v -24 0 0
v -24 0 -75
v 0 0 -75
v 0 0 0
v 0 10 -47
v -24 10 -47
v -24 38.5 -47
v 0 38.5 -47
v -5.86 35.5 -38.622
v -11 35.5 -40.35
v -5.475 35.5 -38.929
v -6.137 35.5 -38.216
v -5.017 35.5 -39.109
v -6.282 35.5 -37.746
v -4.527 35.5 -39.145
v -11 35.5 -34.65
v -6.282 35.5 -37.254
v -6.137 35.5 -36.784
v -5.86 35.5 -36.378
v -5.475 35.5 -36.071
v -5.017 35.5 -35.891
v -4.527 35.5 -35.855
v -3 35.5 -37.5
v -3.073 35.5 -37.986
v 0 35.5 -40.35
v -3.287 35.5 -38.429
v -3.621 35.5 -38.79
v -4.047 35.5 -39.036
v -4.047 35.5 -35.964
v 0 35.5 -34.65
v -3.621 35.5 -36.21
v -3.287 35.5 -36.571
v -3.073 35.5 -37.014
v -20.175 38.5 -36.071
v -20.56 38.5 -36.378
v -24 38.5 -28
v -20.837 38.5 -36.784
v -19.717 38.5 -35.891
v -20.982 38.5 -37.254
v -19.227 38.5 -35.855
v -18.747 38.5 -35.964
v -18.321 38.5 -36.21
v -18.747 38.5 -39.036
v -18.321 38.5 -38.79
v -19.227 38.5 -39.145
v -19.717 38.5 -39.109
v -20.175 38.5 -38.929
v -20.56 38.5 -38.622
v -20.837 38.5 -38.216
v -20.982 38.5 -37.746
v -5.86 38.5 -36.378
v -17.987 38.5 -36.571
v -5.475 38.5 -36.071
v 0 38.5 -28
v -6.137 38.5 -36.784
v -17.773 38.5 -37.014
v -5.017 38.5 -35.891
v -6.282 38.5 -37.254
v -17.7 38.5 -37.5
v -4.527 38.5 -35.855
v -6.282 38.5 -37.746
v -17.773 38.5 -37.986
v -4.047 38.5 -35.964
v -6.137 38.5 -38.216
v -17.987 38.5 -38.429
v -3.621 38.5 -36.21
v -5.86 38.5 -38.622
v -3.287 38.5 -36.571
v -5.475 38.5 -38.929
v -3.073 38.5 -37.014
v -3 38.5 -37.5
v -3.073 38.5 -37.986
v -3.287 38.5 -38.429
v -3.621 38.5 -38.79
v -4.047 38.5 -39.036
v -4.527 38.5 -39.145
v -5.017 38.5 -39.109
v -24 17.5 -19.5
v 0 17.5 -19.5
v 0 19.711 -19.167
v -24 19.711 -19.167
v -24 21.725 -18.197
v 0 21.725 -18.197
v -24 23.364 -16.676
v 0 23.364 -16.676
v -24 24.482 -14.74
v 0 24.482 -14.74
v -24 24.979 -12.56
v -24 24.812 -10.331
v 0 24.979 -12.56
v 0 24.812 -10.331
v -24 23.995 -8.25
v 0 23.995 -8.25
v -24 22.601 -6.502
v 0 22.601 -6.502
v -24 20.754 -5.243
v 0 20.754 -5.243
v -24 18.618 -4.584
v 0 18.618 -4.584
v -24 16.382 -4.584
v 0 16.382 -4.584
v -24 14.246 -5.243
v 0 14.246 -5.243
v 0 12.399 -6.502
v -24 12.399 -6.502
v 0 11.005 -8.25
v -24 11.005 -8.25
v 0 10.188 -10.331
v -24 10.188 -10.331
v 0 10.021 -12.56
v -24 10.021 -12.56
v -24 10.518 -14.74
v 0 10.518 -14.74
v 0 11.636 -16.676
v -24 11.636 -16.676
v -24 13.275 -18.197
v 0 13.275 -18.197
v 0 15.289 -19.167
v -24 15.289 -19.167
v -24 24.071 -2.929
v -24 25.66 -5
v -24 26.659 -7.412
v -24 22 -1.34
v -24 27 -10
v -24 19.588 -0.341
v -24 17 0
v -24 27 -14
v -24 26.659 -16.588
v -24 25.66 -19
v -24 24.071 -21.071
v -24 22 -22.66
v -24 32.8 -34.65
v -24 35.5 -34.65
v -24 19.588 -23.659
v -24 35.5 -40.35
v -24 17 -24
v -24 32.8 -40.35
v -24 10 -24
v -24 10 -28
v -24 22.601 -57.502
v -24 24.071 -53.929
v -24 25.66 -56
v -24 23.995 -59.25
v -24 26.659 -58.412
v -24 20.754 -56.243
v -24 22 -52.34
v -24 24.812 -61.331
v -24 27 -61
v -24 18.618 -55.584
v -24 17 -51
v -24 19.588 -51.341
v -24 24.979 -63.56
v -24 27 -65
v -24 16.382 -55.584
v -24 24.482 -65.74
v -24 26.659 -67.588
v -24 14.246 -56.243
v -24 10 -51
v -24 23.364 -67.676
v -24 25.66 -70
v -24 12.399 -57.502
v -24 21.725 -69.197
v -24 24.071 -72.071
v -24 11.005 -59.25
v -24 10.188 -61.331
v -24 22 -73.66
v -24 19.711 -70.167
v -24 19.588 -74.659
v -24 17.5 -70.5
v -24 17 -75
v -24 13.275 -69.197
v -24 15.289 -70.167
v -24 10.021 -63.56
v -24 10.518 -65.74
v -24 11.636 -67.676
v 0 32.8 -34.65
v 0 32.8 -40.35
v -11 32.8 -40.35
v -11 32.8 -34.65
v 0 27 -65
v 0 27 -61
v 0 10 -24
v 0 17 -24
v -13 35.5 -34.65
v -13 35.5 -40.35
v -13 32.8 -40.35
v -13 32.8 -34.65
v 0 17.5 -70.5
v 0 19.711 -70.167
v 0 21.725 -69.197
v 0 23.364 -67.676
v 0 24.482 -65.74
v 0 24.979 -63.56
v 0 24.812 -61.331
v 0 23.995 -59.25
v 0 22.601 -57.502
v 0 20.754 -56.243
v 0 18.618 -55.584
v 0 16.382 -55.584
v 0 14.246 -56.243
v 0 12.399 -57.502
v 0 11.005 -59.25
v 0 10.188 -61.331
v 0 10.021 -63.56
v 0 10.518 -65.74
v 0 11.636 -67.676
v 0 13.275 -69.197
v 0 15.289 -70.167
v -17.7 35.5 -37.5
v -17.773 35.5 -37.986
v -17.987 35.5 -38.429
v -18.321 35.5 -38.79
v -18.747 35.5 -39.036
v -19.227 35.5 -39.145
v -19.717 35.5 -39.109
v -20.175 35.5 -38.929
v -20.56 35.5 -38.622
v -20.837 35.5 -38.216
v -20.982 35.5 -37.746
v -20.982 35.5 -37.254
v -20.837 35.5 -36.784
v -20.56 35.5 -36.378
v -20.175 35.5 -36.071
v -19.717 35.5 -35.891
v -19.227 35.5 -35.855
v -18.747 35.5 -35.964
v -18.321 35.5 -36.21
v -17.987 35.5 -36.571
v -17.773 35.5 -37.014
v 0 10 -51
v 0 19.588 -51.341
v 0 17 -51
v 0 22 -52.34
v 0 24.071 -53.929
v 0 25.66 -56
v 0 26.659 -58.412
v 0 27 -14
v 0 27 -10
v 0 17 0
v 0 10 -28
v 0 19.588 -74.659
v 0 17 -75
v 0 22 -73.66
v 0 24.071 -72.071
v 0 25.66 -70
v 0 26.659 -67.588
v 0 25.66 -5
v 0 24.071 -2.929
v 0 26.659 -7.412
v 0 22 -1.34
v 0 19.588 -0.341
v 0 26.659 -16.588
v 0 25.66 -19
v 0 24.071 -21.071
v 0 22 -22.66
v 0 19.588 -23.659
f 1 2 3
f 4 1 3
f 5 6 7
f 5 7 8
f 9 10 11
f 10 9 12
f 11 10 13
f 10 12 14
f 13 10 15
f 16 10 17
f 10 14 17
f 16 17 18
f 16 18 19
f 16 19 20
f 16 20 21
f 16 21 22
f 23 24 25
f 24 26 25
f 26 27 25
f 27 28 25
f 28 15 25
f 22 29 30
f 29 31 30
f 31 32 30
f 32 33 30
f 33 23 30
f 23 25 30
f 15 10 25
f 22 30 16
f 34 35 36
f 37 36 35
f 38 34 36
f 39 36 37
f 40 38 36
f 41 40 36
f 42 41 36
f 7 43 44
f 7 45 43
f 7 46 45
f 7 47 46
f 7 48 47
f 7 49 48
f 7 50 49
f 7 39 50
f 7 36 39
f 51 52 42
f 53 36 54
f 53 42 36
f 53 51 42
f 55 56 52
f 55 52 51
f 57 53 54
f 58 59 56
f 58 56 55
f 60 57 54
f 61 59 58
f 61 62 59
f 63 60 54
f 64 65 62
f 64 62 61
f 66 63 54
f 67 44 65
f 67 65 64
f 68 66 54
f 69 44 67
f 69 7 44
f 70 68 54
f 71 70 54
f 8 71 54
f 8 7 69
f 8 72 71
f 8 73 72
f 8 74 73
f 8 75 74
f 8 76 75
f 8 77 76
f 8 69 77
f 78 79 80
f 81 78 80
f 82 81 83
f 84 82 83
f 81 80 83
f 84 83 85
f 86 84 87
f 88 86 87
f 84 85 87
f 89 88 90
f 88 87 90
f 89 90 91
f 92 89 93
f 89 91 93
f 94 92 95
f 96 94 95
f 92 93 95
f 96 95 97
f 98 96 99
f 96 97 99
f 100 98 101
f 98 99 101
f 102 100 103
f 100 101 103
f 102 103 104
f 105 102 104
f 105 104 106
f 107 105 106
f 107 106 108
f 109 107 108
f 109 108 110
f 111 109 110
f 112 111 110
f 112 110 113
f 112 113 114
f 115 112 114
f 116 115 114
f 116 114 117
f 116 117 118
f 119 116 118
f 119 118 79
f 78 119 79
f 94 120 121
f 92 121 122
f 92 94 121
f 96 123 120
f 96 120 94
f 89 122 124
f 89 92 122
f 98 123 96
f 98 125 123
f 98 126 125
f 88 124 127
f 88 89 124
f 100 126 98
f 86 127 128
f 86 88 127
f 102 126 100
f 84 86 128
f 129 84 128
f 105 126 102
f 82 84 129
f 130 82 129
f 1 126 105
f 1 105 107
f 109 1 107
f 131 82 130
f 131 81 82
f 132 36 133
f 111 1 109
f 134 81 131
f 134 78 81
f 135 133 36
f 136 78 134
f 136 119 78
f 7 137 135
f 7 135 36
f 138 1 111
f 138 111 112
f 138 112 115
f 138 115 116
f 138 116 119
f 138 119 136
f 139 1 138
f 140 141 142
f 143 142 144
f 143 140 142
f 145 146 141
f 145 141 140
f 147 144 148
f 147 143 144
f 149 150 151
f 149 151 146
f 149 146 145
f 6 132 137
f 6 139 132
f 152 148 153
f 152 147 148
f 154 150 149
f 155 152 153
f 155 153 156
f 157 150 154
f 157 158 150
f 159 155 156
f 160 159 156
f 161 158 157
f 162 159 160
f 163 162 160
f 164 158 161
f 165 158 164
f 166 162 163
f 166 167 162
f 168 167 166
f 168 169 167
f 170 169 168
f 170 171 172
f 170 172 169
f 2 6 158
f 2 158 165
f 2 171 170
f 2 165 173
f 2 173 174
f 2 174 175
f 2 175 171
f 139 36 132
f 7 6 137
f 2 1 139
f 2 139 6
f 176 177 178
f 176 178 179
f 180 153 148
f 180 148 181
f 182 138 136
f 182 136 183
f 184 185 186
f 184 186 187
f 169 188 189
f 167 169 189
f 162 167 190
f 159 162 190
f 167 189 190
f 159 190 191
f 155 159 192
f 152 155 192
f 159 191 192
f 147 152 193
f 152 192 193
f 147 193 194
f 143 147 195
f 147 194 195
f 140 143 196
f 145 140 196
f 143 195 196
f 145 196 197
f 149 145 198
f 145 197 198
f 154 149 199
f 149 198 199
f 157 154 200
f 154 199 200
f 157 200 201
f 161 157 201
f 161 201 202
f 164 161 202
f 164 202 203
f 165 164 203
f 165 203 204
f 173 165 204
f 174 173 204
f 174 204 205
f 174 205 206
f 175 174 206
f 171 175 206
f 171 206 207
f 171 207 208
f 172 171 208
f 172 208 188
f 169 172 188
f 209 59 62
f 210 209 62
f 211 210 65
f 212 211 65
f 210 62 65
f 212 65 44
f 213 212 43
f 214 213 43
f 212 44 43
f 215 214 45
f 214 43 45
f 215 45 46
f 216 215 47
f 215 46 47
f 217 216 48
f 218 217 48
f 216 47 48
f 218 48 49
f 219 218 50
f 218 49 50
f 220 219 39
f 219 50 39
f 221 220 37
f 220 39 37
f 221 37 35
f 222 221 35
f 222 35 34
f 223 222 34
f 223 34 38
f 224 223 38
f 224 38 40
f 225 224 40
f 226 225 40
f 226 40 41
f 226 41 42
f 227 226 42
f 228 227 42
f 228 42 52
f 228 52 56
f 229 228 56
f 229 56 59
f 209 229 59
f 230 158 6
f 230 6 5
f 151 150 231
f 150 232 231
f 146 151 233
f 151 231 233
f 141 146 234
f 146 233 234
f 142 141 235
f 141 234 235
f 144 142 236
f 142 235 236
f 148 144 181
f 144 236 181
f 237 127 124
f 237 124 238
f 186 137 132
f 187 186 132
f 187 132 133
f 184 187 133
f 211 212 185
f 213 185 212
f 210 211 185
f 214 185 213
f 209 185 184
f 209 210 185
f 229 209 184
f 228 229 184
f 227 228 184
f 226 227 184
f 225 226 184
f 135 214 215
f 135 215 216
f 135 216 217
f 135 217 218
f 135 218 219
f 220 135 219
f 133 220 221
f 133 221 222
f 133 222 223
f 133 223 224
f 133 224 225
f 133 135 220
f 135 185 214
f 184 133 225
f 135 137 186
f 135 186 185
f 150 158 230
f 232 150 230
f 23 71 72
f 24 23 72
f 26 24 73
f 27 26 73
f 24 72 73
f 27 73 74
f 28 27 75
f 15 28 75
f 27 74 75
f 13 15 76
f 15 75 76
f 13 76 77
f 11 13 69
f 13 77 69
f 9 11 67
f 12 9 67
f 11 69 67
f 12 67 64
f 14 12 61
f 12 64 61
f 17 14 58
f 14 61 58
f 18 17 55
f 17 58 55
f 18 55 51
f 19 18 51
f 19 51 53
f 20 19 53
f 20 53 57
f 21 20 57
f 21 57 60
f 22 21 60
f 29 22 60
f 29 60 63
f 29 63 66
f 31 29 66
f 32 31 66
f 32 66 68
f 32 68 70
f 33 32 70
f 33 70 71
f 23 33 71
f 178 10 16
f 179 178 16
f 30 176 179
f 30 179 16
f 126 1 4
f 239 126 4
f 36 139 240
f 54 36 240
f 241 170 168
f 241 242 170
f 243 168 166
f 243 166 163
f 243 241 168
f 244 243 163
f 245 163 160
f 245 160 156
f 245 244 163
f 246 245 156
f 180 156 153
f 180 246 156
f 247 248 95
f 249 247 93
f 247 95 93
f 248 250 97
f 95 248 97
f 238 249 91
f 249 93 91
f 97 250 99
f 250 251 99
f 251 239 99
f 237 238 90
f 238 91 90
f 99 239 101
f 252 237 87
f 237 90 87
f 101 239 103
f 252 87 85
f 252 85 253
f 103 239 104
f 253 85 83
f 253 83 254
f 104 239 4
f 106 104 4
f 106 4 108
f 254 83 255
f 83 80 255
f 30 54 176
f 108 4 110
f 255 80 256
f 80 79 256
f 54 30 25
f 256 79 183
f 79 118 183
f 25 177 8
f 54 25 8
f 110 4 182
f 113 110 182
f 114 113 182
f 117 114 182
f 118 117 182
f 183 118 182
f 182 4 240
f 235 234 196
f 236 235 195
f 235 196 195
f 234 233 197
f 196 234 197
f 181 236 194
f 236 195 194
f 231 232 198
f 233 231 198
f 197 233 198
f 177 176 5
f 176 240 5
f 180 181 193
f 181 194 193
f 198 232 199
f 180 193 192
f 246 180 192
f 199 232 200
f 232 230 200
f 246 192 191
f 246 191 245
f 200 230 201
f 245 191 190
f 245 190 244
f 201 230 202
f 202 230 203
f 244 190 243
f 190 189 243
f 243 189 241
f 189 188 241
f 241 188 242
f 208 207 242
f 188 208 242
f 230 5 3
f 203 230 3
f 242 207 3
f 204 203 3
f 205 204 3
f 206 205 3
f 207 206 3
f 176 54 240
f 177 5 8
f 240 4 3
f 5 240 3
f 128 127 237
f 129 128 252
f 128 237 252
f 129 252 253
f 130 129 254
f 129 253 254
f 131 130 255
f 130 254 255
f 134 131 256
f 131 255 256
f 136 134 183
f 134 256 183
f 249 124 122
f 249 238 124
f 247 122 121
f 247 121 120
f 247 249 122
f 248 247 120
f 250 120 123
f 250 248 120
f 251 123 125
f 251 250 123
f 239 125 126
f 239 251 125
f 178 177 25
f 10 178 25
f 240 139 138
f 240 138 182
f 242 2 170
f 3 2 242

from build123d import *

# Parameters (mm, degrees)
SKETCH1_W           = 24
SKETCH1_H           = 75
BOSS_EXTRUDE1_DEPTH = 10
SKETCH2_W           = 24
SKETCH2_H           = 24
BOSS_EXTRUDE2_DEPTH = 17
SKETCH3_R           = 7.5
CUT_EXTRUDE1_DEPTH  = 25
FILLET1_R           = 10
SKETCH4_W           = 24
SKETCH4_H           = 19
BOSS_EXTRUDE3_DEPTH = 28.5
SKETCH5_W           = 5.7
SKETCH5_H           = 2.7
CUT_EXTRUDE2_DEPTH  = 11
CUT_EXTRUDE3_START  = -24
SKETCH5_2_W         = 5.7
SKETCH5_2_H         = 2.7
CUT_EXTRUDE3_DEPTH  = 11
CUT_EXTRUDE4_REACH  = 40.5
SKETCH6_R           = 1.65


with BuildPart() as part:
    # Sketch1 → Boss-Extrude1 (new body)
    with BuildSketch(Plane(origin=(0, 0, 0), x_dir=(1, 0, 0), z_dir=(0, 1, 0))):
        with Locations((-12, 37.5)):
            Rectangle(SKETCH1_W, SKETCH1_H)
    extrude(amount=BOSS_EXTRUDE1_DEPTH)

    # Sketch2 → Boss-Extrude2 (add)
    with BuildSketch(Plane(origin=(0, 10, 0), x_dir=(1, 0, 0), z_dir=(0, 1, 0))):
        with Locations((-12, 12)):
            Rectangle(SKETCH2_W, SKETCH2_H)
        with Locations((-12, 63)):
            Rectangle(SKETCH2_W, SKETCH2_H)
    extrude(amount=BOSS_EXTRUDE2_DEPTH)

    # Sketch3 → Cut-Extrude1 (cut, through all)
    with BuildSketch(Plane(origin=(0, 0, 0), x_dir=(0, 0, -1), z_dir=(1, 0, 0))):
        with Locations((12, 17.5)):
            Circle(SKETCH3_R)
        with Locations((63, 17.5)):
            Circle(SKETCH3_R)
    extrude(amount=-CUT_EXTRUDE1_DEPTH, mode=Mode.SUBTRACT)

    # Fillet1
    fillet1_edges = [part.edges().sort_by_distance(p)[0] for p in [
        (-12, 27, -51),
        (-12, 27, -24),
        (-12, 27, 0),
        (-12, 27, -75),
    ]]
    fillet(fillet1_edges, radius=FILLET1_R)

    # Sketch4 → Boss-Extrude3 (add)
    with BuildSketch(Plane(origin=(0, 10, 0), x_dir=(1, 0, 0), z_dir=(0, 1, 0))):
        with Locations((-12, 37.5)):
            Rectangle(SKETCH4_W, SKETCH4_H)
    extrude(amount=BOSS_EXTRUDE3_DEPTH)

    # Sketch5 → Cut-Extrude2 (cut)
    with BuildSketch(Plane.ZY.offset(24)):
        with Locations((-37.5, 34.15)):
            Rectangle(SKETCH5_W, SKETCH5_H)
    extrude(amount=-CUT_EXTRUDE2_DEPTH, mode=Mode.SUBTRACT)

    # Sketch5<2> → Cut-Extrude3 (cut)
    with BuildSketch(Plane.ZY.offset(24).offset(CUT_EXTRUDE3_START)):
        with Locations((-37.5, 34.15)):
            Rectangle(SKETCH5_2_W, SKETCH5_2_H)
    extrude(amount=CUT_EXTRUDE3_DEPTH, mode=Mode.SUBTRACT)

    # Sketch6 → Cut-Extrude4 (cut, up to next)
    with BuildSketch(Plane(origin=(0, 38.5, 0), x_dir=(1, 0, 0), z_dir=(0, 1, 0)), mode=Mode.PRIVATE) as cut_extrude4_sk1:
        with Locations((-4.65, 37.5)):
            Circle(SKETCH6_R)
    cut_extrude4_tool1 = extrude(cut_extrude4_sk1.sketch, amount=-CUT_EXTRUDE4_REACH, mode=Mode.PRIVATE) & part.part
    add(cut_extrude4_tool1.solids().sort_by_distance((-4.65, 38.5, -37.5))[0], mode=Mode.SUBTRACT)
    # Sketch6 → Cut-Extrude4 (cut, up to next)
    with BuildSketch(Plane(origin=(0, 38.5, 0), x_dir=(1, 0, 0), z_dir=(0, 1, 0)), mode=Mode.PRIVATE) as cut_extrude4_sk2:
        with Locations((-19.35, 37.5)):
            Circle(SKETCH6_R)
    cut_extrude4_tool2 = extrude(cut_extrude4_sk2.sketch, amount=-CUT_EXTRUDE4_REACH, mode=Mode.PRIVATE) & part.part
    add(cut_extrude4_tool2.solids().sort_by_distance((-19.35, 38.5, -37.5))[0], mode=Mode.SUBTRACT)


solid = part.part
